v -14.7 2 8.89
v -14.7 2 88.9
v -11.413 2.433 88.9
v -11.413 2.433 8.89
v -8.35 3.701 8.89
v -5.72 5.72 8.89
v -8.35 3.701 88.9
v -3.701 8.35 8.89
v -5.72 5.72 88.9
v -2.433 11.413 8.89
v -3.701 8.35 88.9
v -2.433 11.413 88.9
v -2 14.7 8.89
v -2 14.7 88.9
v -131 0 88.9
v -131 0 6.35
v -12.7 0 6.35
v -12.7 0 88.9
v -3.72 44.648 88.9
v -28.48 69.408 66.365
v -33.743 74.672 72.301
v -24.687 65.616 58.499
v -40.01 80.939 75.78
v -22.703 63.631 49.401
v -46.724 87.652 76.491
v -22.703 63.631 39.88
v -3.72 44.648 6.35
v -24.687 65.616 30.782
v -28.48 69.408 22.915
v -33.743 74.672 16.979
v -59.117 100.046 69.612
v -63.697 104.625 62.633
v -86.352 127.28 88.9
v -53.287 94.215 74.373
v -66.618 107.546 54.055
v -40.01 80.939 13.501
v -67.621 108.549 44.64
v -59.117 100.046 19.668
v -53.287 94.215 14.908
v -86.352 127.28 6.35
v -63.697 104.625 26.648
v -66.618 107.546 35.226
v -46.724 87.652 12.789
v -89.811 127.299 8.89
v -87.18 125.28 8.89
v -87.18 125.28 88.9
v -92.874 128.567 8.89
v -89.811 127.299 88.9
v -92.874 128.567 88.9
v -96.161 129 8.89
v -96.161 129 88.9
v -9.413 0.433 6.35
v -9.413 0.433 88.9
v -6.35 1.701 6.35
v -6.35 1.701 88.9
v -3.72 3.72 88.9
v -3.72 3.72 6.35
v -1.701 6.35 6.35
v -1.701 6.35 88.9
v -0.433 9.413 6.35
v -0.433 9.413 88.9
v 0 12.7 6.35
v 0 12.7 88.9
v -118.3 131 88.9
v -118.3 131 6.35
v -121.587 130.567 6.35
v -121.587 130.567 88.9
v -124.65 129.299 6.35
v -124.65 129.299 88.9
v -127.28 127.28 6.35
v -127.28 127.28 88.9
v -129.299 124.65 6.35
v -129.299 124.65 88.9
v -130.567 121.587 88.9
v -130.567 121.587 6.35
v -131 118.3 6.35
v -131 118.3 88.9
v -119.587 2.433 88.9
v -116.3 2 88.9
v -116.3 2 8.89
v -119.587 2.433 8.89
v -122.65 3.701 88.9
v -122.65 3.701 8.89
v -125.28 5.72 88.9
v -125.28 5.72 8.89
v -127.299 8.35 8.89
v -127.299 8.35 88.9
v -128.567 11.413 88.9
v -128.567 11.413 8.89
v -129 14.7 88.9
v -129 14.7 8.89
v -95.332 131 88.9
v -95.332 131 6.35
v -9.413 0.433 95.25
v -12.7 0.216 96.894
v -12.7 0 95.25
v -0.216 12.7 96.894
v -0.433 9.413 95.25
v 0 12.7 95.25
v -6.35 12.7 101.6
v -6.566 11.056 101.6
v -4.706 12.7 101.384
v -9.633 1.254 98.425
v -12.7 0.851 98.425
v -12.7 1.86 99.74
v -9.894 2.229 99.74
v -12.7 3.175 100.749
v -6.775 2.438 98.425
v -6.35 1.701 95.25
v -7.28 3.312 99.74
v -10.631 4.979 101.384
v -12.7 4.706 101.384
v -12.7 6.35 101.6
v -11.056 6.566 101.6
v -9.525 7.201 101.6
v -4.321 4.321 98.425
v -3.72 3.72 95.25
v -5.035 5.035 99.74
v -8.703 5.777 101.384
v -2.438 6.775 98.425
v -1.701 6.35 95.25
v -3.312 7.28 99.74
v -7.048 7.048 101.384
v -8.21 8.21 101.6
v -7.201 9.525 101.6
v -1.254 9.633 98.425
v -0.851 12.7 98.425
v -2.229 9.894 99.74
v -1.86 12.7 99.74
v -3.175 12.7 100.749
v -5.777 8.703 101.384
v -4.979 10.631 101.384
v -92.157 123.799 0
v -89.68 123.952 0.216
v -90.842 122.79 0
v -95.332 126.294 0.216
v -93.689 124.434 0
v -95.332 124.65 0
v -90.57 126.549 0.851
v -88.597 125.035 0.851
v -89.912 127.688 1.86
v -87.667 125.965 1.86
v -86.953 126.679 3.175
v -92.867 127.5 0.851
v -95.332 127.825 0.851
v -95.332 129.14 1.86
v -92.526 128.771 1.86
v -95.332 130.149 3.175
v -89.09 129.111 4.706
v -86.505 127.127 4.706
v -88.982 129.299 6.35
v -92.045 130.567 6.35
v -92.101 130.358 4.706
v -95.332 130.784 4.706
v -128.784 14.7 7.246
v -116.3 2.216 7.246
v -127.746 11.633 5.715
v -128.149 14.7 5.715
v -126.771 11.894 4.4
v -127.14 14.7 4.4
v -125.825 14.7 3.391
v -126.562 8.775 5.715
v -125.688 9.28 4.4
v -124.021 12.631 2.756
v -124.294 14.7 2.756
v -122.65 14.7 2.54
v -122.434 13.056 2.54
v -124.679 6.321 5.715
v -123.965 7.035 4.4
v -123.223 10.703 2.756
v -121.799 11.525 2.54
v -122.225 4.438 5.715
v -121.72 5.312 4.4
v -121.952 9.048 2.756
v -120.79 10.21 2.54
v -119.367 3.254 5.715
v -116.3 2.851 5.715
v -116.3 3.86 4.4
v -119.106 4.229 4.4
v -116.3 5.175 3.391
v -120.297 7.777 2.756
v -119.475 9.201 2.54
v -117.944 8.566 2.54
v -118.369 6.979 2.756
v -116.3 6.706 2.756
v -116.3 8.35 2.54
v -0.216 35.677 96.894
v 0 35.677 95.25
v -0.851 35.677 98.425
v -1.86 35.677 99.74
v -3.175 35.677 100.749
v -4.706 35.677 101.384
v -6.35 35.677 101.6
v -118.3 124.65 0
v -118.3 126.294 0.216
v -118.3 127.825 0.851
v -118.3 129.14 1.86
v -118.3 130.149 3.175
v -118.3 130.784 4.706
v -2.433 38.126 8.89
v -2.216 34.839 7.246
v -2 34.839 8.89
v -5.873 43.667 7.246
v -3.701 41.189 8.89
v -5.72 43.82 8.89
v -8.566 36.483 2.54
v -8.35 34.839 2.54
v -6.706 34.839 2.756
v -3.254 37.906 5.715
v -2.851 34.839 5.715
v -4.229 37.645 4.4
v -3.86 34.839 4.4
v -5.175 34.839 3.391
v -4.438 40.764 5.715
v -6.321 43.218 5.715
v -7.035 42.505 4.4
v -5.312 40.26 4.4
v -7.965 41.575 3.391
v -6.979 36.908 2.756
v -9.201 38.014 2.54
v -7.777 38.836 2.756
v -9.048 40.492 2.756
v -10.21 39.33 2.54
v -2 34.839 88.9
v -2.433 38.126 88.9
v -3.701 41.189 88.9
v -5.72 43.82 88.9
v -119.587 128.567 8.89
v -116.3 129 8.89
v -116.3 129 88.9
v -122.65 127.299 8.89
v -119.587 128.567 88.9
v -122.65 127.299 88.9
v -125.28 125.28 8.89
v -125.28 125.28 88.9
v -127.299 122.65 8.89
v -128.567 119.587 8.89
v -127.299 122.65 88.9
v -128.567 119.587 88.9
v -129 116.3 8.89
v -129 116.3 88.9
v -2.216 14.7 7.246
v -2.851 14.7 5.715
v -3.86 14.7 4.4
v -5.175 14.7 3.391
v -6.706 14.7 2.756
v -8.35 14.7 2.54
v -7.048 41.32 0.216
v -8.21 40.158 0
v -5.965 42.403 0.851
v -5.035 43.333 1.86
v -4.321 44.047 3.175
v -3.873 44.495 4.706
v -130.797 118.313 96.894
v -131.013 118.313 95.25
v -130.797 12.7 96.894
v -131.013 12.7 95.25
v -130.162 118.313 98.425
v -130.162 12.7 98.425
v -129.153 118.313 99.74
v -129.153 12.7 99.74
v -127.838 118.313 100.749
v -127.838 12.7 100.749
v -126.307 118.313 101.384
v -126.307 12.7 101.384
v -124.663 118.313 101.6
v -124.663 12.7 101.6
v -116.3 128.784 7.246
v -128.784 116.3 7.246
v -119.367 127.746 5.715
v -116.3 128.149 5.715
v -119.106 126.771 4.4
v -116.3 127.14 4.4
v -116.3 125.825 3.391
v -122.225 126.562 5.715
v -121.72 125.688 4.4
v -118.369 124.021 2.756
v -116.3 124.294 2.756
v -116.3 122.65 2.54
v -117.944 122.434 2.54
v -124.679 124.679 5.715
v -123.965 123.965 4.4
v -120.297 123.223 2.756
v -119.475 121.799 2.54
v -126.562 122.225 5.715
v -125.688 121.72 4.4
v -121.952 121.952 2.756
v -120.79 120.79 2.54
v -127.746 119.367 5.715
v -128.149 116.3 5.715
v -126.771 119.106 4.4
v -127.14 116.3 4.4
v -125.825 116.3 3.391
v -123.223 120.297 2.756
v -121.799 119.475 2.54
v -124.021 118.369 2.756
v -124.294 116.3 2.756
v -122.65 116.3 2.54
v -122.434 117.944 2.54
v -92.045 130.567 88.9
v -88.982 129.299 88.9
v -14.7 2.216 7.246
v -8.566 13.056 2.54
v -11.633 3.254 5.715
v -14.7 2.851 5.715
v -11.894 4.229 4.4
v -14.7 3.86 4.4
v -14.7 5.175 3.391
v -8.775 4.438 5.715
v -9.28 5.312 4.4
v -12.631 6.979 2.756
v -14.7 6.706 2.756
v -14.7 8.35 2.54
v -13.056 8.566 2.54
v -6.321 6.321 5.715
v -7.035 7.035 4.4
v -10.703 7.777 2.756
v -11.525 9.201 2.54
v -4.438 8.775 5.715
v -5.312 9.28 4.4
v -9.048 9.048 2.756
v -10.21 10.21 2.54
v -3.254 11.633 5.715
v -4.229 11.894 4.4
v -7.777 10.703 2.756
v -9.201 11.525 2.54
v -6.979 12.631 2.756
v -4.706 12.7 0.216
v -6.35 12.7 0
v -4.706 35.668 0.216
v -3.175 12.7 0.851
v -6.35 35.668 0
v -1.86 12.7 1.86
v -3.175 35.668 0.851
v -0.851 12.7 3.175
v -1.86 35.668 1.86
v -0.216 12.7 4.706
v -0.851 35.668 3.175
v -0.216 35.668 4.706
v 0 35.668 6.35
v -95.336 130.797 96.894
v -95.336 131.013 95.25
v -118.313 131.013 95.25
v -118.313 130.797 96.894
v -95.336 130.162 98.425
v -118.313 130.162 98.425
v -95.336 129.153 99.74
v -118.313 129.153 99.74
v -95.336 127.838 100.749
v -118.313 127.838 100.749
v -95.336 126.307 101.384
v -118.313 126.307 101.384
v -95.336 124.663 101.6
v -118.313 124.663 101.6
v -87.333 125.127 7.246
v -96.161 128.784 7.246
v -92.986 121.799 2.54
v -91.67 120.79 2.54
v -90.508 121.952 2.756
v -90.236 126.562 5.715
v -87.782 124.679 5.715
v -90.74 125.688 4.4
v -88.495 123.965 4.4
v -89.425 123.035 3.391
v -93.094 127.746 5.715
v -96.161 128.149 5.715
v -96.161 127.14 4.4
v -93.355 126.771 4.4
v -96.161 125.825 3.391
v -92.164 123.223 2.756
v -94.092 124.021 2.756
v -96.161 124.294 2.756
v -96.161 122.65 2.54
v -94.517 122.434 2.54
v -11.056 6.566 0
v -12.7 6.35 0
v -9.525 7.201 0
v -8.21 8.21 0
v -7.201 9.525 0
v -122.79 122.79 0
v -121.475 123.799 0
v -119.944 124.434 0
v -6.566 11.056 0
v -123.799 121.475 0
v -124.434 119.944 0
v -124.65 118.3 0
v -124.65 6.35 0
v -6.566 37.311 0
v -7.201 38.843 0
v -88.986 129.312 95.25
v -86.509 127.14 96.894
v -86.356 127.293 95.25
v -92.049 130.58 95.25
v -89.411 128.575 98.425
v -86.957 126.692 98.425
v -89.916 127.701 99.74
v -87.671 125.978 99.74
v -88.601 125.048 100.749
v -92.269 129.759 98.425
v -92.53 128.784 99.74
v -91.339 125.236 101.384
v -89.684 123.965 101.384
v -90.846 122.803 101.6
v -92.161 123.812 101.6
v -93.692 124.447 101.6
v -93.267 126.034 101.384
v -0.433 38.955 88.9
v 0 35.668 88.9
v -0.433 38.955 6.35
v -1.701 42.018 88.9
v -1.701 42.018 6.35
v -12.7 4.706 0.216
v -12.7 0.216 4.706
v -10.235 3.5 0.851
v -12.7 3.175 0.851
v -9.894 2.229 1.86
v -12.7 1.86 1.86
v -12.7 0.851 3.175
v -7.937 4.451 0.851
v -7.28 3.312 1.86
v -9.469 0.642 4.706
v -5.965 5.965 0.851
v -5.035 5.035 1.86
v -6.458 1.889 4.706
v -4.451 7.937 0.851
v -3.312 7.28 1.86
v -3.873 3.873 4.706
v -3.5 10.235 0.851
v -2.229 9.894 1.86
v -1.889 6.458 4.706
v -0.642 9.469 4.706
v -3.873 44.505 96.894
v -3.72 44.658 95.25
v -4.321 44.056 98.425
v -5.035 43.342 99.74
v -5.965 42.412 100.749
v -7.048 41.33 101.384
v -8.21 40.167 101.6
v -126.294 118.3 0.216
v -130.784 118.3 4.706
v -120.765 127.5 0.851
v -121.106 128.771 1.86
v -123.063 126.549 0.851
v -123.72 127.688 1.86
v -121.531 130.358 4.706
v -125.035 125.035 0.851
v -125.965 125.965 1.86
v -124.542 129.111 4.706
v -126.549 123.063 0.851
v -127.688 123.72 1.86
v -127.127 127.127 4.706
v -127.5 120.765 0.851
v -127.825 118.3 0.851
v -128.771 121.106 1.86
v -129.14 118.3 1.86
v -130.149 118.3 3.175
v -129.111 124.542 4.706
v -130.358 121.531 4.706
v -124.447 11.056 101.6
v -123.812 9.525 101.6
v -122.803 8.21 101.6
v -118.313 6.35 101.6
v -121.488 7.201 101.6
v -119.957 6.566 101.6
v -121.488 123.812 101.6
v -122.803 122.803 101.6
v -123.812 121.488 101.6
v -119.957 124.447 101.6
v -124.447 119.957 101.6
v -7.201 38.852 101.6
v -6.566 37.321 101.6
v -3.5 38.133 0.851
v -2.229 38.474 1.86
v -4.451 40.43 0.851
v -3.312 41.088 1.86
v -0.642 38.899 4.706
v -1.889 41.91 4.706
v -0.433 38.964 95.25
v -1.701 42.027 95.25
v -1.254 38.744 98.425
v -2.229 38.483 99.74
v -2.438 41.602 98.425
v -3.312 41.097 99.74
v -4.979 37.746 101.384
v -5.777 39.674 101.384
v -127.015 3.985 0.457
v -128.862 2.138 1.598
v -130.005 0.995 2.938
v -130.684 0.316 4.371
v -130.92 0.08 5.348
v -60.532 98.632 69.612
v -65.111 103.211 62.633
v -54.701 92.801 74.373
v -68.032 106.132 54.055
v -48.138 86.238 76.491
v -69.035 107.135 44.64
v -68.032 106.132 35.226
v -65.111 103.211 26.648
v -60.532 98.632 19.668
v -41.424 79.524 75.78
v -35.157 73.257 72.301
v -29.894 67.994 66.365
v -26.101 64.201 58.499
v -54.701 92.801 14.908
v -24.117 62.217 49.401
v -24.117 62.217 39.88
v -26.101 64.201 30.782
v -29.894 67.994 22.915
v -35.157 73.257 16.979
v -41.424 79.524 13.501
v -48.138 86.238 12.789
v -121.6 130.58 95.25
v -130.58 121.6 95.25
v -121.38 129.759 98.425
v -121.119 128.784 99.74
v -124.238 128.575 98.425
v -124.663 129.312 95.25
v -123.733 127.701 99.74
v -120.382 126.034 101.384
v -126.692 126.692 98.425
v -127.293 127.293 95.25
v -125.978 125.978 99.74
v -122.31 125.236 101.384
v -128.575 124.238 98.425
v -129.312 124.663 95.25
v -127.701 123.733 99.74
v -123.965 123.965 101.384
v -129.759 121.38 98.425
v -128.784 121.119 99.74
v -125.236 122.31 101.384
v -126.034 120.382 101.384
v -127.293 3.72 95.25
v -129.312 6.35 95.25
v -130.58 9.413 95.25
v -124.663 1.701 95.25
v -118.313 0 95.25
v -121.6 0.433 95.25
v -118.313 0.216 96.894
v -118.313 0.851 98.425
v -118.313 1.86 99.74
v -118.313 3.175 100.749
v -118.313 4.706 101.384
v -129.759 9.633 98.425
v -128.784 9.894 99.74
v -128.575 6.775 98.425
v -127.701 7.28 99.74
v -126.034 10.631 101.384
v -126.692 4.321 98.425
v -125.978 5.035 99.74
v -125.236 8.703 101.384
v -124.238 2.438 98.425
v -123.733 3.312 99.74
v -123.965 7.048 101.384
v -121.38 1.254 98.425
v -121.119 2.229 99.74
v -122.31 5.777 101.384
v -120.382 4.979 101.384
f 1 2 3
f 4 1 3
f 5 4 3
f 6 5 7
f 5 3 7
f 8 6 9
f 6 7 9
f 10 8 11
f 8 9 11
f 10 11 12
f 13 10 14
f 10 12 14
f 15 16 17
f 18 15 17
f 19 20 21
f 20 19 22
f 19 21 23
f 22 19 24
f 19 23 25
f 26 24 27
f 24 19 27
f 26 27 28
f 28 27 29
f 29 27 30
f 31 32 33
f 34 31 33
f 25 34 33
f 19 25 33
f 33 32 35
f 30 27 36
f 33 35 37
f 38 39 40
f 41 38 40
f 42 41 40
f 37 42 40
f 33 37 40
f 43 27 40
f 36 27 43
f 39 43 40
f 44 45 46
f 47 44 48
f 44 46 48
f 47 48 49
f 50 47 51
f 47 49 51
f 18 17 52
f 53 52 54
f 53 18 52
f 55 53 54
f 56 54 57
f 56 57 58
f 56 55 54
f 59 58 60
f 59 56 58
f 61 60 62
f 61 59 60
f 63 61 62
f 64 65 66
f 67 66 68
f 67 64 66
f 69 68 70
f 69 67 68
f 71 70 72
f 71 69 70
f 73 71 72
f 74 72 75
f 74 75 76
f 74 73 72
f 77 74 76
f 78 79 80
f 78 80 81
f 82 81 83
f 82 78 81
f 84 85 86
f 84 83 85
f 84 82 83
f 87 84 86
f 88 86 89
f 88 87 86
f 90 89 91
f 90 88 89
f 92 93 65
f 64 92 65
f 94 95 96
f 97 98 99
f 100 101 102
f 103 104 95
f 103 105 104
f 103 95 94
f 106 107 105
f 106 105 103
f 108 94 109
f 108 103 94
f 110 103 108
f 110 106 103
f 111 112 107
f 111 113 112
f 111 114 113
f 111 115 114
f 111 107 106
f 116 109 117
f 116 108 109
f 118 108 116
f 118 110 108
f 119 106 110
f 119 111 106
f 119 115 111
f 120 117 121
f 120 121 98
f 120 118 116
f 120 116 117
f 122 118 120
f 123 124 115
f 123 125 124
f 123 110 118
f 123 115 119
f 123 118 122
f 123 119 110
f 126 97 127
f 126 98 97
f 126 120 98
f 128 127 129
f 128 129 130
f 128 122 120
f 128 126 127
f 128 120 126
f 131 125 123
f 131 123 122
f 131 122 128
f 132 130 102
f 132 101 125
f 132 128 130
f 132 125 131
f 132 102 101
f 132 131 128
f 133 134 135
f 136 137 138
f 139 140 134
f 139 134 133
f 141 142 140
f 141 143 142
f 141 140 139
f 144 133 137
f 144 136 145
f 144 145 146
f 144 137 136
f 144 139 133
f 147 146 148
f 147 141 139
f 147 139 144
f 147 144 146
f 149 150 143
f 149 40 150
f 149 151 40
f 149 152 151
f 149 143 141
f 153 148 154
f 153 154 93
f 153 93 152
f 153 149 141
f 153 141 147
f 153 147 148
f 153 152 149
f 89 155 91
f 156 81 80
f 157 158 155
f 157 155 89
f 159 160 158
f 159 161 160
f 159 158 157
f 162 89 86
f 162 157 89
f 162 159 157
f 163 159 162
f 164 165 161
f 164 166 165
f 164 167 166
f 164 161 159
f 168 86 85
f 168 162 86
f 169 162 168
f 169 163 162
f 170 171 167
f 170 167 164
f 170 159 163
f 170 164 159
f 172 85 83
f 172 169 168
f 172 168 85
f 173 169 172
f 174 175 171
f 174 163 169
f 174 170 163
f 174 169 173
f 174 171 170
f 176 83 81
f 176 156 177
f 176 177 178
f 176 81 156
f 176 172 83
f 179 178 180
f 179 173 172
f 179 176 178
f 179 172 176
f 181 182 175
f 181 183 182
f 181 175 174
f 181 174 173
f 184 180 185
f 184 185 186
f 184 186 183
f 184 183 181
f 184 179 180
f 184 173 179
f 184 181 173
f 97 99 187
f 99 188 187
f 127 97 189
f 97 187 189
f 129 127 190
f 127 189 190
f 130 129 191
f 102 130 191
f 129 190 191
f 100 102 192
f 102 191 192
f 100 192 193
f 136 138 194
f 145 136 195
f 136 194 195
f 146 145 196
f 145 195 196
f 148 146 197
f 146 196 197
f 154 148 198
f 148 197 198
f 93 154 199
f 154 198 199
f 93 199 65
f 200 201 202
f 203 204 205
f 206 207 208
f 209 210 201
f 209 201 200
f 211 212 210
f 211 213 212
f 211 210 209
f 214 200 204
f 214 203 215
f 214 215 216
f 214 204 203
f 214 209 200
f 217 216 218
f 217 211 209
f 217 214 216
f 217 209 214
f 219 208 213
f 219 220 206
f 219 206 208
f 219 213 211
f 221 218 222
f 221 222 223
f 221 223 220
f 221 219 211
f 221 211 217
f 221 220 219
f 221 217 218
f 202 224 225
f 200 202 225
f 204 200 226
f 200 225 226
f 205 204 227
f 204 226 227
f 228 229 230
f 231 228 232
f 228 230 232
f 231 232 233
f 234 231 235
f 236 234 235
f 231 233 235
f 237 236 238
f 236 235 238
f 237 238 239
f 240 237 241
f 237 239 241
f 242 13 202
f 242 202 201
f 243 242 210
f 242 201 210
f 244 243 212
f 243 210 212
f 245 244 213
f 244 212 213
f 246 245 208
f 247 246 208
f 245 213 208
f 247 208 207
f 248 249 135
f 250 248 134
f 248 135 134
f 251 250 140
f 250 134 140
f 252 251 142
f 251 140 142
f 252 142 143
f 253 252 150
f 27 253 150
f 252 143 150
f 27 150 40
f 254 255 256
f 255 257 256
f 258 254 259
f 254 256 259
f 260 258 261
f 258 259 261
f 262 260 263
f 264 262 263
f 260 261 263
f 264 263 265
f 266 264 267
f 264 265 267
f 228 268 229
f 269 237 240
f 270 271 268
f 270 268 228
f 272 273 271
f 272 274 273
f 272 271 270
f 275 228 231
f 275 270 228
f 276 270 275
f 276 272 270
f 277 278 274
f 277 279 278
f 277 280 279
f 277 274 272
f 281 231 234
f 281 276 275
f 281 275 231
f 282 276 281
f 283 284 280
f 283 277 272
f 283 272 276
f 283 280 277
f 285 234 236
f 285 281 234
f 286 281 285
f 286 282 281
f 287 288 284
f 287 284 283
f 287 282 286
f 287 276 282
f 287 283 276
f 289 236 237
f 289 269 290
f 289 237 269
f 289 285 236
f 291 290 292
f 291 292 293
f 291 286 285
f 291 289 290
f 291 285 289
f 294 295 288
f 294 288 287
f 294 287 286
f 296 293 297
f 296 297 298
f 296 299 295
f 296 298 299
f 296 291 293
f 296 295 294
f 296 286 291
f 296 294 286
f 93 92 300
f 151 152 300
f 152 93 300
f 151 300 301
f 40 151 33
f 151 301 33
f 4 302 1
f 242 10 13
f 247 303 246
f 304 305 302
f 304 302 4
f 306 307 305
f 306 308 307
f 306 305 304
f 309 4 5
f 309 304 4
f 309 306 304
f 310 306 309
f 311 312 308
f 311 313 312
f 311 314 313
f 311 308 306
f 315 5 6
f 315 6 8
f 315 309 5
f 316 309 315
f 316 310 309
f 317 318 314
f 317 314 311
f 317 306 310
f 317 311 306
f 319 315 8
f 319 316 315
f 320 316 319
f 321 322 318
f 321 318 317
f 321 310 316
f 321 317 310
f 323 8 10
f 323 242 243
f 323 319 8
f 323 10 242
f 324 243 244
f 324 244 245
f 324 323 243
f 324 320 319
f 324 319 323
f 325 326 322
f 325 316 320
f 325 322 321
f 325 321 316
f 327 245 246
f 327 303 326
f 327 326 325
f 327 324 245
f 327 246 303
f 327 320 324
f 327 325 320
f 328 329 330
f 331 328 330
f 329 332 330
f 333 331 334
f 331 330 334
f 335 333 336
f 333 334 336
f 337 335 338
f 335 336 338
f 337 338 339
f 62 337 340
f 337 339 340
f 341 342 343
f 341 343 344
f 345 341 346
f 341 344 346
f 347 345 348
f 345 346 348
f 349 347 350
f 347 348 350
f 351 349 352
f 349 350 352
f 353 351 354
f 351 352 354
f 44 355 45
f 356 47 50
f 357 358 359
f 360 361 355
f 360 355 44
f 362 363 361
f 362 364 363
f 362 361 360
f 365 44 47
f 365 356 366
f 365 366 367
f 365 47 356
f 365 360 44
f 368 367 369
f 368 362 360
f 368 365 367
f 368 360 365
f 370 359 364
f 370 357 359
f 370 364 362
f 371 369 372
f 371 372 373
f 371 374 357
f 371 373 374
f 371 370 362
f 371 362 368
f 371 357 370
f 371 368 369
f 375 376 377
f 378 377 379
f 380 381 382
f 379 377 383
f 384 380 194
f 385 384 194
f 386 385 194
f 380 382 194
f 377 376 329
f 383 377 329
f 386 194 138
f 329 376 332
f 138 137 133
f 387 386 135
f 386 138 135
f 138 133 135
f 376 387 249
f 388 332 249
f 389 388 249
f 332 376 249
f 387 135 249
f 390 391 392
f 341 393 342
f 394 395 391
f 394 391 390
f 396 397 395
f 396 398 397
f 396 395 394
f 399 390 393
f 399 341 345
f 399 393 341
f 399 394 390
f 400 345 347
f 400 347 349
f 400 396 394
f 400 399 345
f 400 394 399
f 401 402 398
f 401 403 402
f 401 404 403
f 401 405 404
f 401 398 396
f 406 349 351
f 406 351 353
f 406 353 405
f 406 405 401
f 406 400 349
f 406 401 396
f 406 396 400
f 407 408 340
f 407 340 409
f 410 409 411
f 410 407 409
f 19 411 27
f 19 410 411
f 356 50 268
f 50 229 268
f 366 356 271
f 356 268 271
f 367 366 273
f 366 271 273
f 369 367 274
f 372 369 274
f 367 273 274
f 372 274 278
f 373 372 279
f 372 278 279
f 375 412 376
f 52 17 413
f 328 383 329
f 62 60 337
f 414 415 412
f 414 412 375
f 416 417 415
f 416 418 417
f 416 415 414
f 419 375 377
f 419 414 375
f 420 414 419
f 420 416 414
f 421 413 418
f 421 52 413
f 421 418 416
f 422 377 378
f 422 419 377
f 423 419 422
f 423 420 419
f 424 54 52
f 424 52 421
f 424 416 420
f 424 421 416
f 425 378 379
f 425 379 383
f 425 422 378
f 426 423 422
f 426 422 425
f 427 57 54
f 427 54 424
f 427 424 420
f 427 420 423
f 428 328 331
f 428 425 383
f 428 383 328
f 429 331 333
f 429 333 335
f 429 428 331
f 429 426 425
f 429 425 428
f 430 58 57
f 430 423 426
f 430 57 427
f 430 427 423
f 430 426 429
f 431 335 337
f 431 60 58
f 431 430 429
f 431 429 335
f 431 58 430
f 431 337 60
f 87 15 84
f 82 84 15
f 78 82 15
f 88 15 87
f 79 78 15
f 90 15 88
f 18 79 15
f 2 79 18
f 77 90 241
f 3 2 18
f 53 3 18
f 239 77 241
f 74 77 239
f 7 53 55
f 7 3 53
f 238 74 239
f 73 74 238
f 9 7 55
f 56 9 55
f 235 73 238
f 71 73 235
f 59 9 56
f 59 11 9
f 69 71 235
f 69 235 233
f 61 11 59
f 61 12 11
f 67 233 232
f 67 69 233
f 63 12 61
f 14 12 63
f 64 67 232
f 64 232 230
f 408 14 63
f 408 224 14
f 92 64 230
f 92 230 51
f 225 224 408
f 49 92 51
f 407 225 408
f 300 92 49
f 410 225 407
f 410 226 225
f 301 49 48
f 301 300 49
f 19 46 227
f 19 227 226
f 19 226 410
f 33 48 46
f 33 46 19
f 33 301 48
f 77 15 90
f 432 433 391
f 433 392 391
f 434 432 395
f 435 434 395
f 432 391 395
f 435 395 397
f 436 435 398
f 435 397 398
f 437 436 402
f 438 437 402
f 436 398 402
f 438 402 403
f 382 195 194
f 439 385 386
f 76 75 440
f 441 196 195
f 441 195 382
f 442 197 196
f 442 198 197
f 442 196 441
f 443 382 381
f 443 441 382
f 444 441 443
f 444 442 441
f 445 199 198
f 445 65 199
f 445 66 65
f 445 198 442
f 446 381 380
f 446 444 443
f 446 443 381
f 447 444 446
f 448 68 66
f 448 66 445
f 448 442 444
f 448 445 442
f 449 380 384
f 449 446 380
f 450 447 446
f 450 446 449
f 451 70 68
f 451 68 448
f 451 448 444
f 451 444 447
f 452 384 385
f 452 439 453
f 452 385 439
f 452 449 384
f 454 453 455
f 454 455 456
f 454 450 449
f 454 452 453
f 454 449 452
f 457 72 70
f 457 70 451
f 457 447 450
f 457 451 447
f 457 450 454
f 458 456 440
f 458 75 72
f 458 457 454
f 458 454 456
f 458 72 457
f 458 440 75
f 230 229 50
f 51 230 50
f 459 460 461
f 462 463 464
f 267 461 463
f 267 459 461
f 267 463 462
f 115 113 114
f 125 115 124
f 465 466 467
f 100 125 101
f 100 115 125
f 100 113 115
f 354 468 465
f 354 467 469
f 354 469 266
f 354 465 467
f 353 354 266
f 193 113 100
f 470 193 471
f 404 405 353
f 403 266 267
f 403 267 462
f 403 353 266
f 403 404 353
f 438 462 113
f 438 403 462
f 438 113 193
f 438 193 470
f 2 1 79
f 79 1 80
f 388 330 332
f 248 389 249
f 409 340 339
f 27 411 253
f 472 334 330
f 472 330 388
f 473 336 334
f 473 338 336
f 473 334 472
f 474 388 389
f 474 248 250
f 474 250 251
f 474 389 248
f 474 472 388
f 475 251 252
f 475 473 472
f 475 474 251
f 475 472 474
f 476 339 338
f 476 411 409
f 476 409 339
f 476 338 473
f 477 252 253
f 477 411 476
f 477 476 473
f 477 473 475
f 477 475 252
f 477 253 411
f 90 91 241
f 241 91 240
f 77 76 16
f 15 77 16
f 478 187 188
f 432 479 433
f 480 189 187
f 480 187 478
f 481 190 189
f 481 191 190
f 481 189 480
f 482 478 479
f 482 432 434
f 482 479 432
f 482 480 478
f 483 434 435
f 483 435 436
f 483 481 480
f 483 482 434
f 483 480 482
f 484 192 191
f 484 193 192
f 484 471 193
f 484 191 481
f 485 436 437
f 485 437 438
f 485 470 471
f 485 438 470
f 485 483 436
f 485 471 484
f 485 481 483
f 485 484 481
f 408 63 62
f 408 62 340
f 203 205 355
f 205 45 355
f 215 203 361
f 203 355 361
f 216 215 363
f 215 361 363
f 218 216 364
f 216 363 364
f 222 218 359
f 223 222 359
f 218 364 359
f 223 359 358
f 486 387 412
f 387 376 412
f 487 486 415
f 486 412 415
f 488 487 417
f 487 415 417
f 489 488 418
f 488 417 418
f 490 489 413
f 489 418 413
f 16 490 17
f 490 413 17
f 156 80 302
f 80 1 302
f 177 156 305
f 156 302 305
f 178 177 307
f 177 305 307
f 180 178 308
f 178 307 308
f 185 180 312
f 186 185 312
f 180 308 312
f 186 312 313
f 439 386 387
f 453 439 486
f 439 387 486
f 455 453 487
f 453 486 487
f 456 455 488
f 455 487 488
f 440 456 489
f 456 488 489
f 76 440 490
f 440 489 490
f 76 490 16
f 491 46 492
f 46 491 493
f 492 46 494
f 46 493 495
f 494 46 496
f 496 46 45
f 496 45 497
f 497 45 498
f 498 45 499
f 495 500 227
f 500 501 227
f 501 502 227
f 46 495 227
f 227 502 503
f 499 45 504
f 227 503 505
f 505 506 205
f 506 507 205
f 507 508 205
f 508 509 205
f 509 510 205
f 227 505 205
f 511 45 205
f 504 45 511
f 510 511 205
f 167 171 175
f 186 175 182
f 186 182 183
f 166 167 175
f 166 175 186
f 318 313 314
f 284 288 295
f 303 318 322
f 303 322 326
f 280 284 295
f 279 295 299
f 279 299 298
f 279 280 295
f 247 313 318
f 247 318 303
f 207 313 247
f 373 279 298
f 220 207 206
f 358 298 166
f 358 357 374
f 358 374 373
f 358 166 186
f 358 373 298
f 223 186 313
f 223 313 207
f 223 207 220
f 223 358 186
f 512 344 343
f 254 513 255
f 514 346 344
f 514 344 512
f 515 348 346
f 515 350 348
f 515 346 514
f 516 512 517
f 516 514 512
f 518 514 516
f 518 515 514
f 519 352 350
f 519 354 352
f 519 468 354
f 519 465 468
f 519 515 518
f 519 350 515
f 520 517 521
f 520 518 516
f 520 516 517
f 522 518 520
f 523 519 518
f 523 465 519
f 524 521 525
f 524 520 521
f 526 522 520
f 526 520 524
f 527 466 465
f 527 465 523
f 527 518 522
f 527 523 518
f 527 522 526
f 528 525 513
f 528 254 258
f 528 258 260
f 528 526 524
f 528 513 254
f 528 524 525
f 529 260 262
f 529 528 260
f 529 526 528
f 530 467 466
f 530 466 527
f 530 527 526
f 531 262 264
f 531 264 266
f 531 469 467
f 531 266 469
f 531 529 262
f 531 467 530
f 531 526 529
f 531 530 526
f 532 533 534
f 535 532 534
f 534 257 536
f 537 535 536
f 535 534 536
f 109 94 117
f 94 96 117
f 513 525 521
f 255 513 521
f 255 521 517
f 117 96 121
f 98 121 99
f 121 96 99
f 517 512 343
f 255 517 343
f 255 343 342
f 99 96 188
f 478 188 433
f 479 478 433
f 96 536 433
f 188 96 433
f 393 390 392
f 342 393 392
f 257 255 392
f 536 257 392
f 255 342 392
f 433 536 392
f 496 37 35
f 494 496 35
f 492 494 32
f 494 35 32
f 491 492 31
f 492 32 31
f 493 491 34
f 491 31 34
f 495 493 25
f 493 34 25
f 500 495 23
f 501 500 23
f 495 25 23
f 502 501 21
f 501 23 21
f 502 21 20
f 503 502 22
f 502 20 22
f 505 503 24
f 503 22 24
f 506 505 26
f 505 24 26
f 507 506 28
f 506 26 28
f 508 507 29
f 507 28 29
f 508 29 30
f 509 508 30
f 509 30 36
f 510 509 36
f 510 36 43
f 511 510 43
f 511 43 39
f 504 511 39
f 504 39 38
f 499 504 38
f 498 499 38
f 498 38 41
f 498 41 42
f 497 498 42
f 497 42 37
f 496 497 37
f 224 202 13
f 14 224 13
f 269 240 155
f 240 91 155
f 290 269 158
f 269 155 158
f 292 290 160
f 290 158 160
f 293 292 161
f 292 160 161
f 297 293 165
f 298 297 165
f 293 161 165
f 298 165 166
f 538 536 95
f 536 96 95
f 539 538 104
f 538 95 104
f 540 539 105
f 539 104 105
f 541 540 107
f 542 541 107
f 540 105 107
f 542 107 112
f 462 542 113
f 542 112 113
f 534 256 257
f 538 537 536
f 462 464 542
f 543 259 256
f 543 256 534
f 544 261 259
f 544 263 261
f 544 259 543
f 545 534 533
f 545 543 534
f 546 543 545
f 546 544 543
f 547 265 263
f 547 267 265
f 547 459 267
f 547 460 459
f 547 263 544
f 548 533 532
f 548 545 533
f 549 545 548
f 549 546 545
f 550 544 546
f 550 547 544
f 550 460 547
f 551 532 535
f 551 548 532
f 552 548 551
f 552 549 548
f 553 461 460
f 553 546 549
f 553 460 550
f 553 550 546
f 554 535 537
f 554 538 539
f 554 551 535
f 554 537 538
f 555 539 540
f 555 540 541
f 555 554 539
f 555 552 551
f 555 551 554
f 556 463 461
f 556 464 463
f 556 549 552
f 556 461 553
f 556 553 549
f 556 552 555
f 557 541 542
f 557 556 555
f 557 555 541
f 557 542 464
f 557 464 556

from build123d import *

# Parameters (mm, degrees)
F3_DEPTH = 6.35
F4_DEPTH = 88.9
F5_DEPTH = 2.54
F6_R     = 31.9402199722
F7_DEPTH = 25.4
F8_R     = 12.7
F9_R     = 12.7
F10_R    = 6.34999
F11_R    = 6.35


# Not quite as in the source:
# - a fillet or chamfer is up to 0.001 mm smaller than in the source, because OpenCascade refuses the exact size


with BuildPart() as f3:
    # F2 (on offset) → F3 (new body)
    with BuildSketch(Plane.XY.offset(101.6)):
        Polygon((-129.0066, 2.0066), (-2.0066, 2.0066), (-2.0066, 40.1066), (-90.9066, 129.0066), (-129.0066, 129.0066), align=None)
        Polygon((-2.0066, 2.0066), (0, 0), (0, 40.9377609343), (-2.0066, 40.1066), align=None)
        Polygon((-90.0754390657, 131.0132), (-131.0132, 131.0132), (-129.0066, 129.0066), (-90.9066, 129.0066), align=None)
        Polygon((-2.0066, 40.1066), (0, 40.9377609343), (-90.0754390657, 131.0132), (-90.9066, 129.0066), align=None)
        Polygon((-131.0132, 0), (0, 0), (-2.0066, 2.0066), (-129.0066, 2.0066), align=None)
        Polygon((-131.0132, 131.0132), (-131.0132, 0), (-129.0066, 2.0066), (-129.0066, 129.0066), align=None)
    extrude(amount=-F3_DEPTH)

    # F9
    f9_edges = [f3.edges().sort_by_distance(p)[0] for p in [
        (0, 40.937761, 98.425),
        (-90.075439, 131.0132, 98.425),
        (-131.0132, 131.0132, 98.425),
        (-131.0132, 0, 98.425),
        (0, 0, 98.425),
    ]]
    fillet(f9_edges, radius=F9_R)

    # F10 (radius 6.35 in the source; OpenCascade refuses exactly that, so slightly less here)
    f10_edges = [f3.edges().sort_by_distance(p)[0] for p in [
        (0, 24.188624, 101.6),
        (-3.719744, 3.719744, 101.6),
        (-0.96673, 40.537328, 101.6),
        (-65.5066, 0, 101.6),
        (-45.03772, 85.97548, 101.6),
        (-127.293456, 3.719744, 101.6),
        (-90.475872, 130.04647, 101.6),
        (-131.0132, 65.5066, 101.6),
        (-106.824576, 131.0132, 101.6),
        (-127.293456, 127.293456, 101.6),
    ]]
    fillet(f10_edges, radius=F10_R)


with BuildPart() as f4:
    # F0 (on Top) → F4 (new body)
    with BuildSketch(Plane.XY):
        Polygon((-90.0715728753, 131), (-131, 131), (-131, 0), (0, 0), (0, 40.9284271247), align=None)
        Polygon((-129, 2), (-129, 129), (-90.9, 129), (-2, 40.1), (-2, 2), align=None, mode=Mode.SUBTRACT)
    extrude(amount=F4_DEPTH)

    # F0 (on Top) → F5 (join)
    with BuildSketch(Plane.XY):
        Polygon((-90.9, 129), (-129, 129), (-129, 2), (-2, 2), (-2, 40.1), align=None)
    extrude(amount=F5_DEPTH)

    # F6 (on face) → F7 (cut)
    with BuildSketch(Plane(origin=(20.4642135624, 20.4642135624, 0), x_dir=(-0.7071067812, 0.7071067812, 0), z_dir=(0.7071067812, 0.7071067812, 0))):
        with Locations((92.6309883354, 44.6402199722)):
            Circle(F6_R)
    extrude(amount=-F7_DEPTH, mode=Mode.SUBTRACT)

    # F8
    f8_edges = [f4.edges().sort_by_distance(p)[0] for p in [
        (0, 40.928427, 44.45),
        (0, 0, 44.45),
        (-90.071573, 131, 44.45),
        (-131, 131, 44.45),
        (-129, 2, 45.72),
        (-2, 2, 45.72),
        (-2, 40.1, 45.72),
        (-90.9, 129, 45.72),
        (-129, 129, 45.72),
    ]]
    fillet(f8_edges, radius=F8_R)

    # F11
    f11_edges = [f4.edges().sort_by_distance(p)[0] for p in [
        (-106.230256, 129, 2.54),
        (-91.300433, 128.03327, 2.54),
        (-125.280256, 125.280256, 2.54),
        (-46.45, 84.55, 2.54),
        (-129, 65.5, 2.54),
        (-2.96673, 39.699567, 2.54),
        (-125.280256, 5.719744, 2.54),
        (-2, 24.769744, 2.54),
        (-65.5, 2, 2.54),
        (-5.719744, 5.719744, 2.54),
        (-45.035786, 85.964214, 0),
        (-0.96673, 40.527994, 0),
        (-90.472006, 130.03327, 0),
        (0, 24.183957, 0),
        (-106.816043, 131, 0),
        (-3.719744, 3.719744, 0),
        (-127.280256, 127.280256, 0),
        (-71.85, 0, 0),
        (-131, 59.15, 0),
    ]]
    fillet(f11_edges, radius=F11_R)


solid = Compound([f3.part, f4.part])
